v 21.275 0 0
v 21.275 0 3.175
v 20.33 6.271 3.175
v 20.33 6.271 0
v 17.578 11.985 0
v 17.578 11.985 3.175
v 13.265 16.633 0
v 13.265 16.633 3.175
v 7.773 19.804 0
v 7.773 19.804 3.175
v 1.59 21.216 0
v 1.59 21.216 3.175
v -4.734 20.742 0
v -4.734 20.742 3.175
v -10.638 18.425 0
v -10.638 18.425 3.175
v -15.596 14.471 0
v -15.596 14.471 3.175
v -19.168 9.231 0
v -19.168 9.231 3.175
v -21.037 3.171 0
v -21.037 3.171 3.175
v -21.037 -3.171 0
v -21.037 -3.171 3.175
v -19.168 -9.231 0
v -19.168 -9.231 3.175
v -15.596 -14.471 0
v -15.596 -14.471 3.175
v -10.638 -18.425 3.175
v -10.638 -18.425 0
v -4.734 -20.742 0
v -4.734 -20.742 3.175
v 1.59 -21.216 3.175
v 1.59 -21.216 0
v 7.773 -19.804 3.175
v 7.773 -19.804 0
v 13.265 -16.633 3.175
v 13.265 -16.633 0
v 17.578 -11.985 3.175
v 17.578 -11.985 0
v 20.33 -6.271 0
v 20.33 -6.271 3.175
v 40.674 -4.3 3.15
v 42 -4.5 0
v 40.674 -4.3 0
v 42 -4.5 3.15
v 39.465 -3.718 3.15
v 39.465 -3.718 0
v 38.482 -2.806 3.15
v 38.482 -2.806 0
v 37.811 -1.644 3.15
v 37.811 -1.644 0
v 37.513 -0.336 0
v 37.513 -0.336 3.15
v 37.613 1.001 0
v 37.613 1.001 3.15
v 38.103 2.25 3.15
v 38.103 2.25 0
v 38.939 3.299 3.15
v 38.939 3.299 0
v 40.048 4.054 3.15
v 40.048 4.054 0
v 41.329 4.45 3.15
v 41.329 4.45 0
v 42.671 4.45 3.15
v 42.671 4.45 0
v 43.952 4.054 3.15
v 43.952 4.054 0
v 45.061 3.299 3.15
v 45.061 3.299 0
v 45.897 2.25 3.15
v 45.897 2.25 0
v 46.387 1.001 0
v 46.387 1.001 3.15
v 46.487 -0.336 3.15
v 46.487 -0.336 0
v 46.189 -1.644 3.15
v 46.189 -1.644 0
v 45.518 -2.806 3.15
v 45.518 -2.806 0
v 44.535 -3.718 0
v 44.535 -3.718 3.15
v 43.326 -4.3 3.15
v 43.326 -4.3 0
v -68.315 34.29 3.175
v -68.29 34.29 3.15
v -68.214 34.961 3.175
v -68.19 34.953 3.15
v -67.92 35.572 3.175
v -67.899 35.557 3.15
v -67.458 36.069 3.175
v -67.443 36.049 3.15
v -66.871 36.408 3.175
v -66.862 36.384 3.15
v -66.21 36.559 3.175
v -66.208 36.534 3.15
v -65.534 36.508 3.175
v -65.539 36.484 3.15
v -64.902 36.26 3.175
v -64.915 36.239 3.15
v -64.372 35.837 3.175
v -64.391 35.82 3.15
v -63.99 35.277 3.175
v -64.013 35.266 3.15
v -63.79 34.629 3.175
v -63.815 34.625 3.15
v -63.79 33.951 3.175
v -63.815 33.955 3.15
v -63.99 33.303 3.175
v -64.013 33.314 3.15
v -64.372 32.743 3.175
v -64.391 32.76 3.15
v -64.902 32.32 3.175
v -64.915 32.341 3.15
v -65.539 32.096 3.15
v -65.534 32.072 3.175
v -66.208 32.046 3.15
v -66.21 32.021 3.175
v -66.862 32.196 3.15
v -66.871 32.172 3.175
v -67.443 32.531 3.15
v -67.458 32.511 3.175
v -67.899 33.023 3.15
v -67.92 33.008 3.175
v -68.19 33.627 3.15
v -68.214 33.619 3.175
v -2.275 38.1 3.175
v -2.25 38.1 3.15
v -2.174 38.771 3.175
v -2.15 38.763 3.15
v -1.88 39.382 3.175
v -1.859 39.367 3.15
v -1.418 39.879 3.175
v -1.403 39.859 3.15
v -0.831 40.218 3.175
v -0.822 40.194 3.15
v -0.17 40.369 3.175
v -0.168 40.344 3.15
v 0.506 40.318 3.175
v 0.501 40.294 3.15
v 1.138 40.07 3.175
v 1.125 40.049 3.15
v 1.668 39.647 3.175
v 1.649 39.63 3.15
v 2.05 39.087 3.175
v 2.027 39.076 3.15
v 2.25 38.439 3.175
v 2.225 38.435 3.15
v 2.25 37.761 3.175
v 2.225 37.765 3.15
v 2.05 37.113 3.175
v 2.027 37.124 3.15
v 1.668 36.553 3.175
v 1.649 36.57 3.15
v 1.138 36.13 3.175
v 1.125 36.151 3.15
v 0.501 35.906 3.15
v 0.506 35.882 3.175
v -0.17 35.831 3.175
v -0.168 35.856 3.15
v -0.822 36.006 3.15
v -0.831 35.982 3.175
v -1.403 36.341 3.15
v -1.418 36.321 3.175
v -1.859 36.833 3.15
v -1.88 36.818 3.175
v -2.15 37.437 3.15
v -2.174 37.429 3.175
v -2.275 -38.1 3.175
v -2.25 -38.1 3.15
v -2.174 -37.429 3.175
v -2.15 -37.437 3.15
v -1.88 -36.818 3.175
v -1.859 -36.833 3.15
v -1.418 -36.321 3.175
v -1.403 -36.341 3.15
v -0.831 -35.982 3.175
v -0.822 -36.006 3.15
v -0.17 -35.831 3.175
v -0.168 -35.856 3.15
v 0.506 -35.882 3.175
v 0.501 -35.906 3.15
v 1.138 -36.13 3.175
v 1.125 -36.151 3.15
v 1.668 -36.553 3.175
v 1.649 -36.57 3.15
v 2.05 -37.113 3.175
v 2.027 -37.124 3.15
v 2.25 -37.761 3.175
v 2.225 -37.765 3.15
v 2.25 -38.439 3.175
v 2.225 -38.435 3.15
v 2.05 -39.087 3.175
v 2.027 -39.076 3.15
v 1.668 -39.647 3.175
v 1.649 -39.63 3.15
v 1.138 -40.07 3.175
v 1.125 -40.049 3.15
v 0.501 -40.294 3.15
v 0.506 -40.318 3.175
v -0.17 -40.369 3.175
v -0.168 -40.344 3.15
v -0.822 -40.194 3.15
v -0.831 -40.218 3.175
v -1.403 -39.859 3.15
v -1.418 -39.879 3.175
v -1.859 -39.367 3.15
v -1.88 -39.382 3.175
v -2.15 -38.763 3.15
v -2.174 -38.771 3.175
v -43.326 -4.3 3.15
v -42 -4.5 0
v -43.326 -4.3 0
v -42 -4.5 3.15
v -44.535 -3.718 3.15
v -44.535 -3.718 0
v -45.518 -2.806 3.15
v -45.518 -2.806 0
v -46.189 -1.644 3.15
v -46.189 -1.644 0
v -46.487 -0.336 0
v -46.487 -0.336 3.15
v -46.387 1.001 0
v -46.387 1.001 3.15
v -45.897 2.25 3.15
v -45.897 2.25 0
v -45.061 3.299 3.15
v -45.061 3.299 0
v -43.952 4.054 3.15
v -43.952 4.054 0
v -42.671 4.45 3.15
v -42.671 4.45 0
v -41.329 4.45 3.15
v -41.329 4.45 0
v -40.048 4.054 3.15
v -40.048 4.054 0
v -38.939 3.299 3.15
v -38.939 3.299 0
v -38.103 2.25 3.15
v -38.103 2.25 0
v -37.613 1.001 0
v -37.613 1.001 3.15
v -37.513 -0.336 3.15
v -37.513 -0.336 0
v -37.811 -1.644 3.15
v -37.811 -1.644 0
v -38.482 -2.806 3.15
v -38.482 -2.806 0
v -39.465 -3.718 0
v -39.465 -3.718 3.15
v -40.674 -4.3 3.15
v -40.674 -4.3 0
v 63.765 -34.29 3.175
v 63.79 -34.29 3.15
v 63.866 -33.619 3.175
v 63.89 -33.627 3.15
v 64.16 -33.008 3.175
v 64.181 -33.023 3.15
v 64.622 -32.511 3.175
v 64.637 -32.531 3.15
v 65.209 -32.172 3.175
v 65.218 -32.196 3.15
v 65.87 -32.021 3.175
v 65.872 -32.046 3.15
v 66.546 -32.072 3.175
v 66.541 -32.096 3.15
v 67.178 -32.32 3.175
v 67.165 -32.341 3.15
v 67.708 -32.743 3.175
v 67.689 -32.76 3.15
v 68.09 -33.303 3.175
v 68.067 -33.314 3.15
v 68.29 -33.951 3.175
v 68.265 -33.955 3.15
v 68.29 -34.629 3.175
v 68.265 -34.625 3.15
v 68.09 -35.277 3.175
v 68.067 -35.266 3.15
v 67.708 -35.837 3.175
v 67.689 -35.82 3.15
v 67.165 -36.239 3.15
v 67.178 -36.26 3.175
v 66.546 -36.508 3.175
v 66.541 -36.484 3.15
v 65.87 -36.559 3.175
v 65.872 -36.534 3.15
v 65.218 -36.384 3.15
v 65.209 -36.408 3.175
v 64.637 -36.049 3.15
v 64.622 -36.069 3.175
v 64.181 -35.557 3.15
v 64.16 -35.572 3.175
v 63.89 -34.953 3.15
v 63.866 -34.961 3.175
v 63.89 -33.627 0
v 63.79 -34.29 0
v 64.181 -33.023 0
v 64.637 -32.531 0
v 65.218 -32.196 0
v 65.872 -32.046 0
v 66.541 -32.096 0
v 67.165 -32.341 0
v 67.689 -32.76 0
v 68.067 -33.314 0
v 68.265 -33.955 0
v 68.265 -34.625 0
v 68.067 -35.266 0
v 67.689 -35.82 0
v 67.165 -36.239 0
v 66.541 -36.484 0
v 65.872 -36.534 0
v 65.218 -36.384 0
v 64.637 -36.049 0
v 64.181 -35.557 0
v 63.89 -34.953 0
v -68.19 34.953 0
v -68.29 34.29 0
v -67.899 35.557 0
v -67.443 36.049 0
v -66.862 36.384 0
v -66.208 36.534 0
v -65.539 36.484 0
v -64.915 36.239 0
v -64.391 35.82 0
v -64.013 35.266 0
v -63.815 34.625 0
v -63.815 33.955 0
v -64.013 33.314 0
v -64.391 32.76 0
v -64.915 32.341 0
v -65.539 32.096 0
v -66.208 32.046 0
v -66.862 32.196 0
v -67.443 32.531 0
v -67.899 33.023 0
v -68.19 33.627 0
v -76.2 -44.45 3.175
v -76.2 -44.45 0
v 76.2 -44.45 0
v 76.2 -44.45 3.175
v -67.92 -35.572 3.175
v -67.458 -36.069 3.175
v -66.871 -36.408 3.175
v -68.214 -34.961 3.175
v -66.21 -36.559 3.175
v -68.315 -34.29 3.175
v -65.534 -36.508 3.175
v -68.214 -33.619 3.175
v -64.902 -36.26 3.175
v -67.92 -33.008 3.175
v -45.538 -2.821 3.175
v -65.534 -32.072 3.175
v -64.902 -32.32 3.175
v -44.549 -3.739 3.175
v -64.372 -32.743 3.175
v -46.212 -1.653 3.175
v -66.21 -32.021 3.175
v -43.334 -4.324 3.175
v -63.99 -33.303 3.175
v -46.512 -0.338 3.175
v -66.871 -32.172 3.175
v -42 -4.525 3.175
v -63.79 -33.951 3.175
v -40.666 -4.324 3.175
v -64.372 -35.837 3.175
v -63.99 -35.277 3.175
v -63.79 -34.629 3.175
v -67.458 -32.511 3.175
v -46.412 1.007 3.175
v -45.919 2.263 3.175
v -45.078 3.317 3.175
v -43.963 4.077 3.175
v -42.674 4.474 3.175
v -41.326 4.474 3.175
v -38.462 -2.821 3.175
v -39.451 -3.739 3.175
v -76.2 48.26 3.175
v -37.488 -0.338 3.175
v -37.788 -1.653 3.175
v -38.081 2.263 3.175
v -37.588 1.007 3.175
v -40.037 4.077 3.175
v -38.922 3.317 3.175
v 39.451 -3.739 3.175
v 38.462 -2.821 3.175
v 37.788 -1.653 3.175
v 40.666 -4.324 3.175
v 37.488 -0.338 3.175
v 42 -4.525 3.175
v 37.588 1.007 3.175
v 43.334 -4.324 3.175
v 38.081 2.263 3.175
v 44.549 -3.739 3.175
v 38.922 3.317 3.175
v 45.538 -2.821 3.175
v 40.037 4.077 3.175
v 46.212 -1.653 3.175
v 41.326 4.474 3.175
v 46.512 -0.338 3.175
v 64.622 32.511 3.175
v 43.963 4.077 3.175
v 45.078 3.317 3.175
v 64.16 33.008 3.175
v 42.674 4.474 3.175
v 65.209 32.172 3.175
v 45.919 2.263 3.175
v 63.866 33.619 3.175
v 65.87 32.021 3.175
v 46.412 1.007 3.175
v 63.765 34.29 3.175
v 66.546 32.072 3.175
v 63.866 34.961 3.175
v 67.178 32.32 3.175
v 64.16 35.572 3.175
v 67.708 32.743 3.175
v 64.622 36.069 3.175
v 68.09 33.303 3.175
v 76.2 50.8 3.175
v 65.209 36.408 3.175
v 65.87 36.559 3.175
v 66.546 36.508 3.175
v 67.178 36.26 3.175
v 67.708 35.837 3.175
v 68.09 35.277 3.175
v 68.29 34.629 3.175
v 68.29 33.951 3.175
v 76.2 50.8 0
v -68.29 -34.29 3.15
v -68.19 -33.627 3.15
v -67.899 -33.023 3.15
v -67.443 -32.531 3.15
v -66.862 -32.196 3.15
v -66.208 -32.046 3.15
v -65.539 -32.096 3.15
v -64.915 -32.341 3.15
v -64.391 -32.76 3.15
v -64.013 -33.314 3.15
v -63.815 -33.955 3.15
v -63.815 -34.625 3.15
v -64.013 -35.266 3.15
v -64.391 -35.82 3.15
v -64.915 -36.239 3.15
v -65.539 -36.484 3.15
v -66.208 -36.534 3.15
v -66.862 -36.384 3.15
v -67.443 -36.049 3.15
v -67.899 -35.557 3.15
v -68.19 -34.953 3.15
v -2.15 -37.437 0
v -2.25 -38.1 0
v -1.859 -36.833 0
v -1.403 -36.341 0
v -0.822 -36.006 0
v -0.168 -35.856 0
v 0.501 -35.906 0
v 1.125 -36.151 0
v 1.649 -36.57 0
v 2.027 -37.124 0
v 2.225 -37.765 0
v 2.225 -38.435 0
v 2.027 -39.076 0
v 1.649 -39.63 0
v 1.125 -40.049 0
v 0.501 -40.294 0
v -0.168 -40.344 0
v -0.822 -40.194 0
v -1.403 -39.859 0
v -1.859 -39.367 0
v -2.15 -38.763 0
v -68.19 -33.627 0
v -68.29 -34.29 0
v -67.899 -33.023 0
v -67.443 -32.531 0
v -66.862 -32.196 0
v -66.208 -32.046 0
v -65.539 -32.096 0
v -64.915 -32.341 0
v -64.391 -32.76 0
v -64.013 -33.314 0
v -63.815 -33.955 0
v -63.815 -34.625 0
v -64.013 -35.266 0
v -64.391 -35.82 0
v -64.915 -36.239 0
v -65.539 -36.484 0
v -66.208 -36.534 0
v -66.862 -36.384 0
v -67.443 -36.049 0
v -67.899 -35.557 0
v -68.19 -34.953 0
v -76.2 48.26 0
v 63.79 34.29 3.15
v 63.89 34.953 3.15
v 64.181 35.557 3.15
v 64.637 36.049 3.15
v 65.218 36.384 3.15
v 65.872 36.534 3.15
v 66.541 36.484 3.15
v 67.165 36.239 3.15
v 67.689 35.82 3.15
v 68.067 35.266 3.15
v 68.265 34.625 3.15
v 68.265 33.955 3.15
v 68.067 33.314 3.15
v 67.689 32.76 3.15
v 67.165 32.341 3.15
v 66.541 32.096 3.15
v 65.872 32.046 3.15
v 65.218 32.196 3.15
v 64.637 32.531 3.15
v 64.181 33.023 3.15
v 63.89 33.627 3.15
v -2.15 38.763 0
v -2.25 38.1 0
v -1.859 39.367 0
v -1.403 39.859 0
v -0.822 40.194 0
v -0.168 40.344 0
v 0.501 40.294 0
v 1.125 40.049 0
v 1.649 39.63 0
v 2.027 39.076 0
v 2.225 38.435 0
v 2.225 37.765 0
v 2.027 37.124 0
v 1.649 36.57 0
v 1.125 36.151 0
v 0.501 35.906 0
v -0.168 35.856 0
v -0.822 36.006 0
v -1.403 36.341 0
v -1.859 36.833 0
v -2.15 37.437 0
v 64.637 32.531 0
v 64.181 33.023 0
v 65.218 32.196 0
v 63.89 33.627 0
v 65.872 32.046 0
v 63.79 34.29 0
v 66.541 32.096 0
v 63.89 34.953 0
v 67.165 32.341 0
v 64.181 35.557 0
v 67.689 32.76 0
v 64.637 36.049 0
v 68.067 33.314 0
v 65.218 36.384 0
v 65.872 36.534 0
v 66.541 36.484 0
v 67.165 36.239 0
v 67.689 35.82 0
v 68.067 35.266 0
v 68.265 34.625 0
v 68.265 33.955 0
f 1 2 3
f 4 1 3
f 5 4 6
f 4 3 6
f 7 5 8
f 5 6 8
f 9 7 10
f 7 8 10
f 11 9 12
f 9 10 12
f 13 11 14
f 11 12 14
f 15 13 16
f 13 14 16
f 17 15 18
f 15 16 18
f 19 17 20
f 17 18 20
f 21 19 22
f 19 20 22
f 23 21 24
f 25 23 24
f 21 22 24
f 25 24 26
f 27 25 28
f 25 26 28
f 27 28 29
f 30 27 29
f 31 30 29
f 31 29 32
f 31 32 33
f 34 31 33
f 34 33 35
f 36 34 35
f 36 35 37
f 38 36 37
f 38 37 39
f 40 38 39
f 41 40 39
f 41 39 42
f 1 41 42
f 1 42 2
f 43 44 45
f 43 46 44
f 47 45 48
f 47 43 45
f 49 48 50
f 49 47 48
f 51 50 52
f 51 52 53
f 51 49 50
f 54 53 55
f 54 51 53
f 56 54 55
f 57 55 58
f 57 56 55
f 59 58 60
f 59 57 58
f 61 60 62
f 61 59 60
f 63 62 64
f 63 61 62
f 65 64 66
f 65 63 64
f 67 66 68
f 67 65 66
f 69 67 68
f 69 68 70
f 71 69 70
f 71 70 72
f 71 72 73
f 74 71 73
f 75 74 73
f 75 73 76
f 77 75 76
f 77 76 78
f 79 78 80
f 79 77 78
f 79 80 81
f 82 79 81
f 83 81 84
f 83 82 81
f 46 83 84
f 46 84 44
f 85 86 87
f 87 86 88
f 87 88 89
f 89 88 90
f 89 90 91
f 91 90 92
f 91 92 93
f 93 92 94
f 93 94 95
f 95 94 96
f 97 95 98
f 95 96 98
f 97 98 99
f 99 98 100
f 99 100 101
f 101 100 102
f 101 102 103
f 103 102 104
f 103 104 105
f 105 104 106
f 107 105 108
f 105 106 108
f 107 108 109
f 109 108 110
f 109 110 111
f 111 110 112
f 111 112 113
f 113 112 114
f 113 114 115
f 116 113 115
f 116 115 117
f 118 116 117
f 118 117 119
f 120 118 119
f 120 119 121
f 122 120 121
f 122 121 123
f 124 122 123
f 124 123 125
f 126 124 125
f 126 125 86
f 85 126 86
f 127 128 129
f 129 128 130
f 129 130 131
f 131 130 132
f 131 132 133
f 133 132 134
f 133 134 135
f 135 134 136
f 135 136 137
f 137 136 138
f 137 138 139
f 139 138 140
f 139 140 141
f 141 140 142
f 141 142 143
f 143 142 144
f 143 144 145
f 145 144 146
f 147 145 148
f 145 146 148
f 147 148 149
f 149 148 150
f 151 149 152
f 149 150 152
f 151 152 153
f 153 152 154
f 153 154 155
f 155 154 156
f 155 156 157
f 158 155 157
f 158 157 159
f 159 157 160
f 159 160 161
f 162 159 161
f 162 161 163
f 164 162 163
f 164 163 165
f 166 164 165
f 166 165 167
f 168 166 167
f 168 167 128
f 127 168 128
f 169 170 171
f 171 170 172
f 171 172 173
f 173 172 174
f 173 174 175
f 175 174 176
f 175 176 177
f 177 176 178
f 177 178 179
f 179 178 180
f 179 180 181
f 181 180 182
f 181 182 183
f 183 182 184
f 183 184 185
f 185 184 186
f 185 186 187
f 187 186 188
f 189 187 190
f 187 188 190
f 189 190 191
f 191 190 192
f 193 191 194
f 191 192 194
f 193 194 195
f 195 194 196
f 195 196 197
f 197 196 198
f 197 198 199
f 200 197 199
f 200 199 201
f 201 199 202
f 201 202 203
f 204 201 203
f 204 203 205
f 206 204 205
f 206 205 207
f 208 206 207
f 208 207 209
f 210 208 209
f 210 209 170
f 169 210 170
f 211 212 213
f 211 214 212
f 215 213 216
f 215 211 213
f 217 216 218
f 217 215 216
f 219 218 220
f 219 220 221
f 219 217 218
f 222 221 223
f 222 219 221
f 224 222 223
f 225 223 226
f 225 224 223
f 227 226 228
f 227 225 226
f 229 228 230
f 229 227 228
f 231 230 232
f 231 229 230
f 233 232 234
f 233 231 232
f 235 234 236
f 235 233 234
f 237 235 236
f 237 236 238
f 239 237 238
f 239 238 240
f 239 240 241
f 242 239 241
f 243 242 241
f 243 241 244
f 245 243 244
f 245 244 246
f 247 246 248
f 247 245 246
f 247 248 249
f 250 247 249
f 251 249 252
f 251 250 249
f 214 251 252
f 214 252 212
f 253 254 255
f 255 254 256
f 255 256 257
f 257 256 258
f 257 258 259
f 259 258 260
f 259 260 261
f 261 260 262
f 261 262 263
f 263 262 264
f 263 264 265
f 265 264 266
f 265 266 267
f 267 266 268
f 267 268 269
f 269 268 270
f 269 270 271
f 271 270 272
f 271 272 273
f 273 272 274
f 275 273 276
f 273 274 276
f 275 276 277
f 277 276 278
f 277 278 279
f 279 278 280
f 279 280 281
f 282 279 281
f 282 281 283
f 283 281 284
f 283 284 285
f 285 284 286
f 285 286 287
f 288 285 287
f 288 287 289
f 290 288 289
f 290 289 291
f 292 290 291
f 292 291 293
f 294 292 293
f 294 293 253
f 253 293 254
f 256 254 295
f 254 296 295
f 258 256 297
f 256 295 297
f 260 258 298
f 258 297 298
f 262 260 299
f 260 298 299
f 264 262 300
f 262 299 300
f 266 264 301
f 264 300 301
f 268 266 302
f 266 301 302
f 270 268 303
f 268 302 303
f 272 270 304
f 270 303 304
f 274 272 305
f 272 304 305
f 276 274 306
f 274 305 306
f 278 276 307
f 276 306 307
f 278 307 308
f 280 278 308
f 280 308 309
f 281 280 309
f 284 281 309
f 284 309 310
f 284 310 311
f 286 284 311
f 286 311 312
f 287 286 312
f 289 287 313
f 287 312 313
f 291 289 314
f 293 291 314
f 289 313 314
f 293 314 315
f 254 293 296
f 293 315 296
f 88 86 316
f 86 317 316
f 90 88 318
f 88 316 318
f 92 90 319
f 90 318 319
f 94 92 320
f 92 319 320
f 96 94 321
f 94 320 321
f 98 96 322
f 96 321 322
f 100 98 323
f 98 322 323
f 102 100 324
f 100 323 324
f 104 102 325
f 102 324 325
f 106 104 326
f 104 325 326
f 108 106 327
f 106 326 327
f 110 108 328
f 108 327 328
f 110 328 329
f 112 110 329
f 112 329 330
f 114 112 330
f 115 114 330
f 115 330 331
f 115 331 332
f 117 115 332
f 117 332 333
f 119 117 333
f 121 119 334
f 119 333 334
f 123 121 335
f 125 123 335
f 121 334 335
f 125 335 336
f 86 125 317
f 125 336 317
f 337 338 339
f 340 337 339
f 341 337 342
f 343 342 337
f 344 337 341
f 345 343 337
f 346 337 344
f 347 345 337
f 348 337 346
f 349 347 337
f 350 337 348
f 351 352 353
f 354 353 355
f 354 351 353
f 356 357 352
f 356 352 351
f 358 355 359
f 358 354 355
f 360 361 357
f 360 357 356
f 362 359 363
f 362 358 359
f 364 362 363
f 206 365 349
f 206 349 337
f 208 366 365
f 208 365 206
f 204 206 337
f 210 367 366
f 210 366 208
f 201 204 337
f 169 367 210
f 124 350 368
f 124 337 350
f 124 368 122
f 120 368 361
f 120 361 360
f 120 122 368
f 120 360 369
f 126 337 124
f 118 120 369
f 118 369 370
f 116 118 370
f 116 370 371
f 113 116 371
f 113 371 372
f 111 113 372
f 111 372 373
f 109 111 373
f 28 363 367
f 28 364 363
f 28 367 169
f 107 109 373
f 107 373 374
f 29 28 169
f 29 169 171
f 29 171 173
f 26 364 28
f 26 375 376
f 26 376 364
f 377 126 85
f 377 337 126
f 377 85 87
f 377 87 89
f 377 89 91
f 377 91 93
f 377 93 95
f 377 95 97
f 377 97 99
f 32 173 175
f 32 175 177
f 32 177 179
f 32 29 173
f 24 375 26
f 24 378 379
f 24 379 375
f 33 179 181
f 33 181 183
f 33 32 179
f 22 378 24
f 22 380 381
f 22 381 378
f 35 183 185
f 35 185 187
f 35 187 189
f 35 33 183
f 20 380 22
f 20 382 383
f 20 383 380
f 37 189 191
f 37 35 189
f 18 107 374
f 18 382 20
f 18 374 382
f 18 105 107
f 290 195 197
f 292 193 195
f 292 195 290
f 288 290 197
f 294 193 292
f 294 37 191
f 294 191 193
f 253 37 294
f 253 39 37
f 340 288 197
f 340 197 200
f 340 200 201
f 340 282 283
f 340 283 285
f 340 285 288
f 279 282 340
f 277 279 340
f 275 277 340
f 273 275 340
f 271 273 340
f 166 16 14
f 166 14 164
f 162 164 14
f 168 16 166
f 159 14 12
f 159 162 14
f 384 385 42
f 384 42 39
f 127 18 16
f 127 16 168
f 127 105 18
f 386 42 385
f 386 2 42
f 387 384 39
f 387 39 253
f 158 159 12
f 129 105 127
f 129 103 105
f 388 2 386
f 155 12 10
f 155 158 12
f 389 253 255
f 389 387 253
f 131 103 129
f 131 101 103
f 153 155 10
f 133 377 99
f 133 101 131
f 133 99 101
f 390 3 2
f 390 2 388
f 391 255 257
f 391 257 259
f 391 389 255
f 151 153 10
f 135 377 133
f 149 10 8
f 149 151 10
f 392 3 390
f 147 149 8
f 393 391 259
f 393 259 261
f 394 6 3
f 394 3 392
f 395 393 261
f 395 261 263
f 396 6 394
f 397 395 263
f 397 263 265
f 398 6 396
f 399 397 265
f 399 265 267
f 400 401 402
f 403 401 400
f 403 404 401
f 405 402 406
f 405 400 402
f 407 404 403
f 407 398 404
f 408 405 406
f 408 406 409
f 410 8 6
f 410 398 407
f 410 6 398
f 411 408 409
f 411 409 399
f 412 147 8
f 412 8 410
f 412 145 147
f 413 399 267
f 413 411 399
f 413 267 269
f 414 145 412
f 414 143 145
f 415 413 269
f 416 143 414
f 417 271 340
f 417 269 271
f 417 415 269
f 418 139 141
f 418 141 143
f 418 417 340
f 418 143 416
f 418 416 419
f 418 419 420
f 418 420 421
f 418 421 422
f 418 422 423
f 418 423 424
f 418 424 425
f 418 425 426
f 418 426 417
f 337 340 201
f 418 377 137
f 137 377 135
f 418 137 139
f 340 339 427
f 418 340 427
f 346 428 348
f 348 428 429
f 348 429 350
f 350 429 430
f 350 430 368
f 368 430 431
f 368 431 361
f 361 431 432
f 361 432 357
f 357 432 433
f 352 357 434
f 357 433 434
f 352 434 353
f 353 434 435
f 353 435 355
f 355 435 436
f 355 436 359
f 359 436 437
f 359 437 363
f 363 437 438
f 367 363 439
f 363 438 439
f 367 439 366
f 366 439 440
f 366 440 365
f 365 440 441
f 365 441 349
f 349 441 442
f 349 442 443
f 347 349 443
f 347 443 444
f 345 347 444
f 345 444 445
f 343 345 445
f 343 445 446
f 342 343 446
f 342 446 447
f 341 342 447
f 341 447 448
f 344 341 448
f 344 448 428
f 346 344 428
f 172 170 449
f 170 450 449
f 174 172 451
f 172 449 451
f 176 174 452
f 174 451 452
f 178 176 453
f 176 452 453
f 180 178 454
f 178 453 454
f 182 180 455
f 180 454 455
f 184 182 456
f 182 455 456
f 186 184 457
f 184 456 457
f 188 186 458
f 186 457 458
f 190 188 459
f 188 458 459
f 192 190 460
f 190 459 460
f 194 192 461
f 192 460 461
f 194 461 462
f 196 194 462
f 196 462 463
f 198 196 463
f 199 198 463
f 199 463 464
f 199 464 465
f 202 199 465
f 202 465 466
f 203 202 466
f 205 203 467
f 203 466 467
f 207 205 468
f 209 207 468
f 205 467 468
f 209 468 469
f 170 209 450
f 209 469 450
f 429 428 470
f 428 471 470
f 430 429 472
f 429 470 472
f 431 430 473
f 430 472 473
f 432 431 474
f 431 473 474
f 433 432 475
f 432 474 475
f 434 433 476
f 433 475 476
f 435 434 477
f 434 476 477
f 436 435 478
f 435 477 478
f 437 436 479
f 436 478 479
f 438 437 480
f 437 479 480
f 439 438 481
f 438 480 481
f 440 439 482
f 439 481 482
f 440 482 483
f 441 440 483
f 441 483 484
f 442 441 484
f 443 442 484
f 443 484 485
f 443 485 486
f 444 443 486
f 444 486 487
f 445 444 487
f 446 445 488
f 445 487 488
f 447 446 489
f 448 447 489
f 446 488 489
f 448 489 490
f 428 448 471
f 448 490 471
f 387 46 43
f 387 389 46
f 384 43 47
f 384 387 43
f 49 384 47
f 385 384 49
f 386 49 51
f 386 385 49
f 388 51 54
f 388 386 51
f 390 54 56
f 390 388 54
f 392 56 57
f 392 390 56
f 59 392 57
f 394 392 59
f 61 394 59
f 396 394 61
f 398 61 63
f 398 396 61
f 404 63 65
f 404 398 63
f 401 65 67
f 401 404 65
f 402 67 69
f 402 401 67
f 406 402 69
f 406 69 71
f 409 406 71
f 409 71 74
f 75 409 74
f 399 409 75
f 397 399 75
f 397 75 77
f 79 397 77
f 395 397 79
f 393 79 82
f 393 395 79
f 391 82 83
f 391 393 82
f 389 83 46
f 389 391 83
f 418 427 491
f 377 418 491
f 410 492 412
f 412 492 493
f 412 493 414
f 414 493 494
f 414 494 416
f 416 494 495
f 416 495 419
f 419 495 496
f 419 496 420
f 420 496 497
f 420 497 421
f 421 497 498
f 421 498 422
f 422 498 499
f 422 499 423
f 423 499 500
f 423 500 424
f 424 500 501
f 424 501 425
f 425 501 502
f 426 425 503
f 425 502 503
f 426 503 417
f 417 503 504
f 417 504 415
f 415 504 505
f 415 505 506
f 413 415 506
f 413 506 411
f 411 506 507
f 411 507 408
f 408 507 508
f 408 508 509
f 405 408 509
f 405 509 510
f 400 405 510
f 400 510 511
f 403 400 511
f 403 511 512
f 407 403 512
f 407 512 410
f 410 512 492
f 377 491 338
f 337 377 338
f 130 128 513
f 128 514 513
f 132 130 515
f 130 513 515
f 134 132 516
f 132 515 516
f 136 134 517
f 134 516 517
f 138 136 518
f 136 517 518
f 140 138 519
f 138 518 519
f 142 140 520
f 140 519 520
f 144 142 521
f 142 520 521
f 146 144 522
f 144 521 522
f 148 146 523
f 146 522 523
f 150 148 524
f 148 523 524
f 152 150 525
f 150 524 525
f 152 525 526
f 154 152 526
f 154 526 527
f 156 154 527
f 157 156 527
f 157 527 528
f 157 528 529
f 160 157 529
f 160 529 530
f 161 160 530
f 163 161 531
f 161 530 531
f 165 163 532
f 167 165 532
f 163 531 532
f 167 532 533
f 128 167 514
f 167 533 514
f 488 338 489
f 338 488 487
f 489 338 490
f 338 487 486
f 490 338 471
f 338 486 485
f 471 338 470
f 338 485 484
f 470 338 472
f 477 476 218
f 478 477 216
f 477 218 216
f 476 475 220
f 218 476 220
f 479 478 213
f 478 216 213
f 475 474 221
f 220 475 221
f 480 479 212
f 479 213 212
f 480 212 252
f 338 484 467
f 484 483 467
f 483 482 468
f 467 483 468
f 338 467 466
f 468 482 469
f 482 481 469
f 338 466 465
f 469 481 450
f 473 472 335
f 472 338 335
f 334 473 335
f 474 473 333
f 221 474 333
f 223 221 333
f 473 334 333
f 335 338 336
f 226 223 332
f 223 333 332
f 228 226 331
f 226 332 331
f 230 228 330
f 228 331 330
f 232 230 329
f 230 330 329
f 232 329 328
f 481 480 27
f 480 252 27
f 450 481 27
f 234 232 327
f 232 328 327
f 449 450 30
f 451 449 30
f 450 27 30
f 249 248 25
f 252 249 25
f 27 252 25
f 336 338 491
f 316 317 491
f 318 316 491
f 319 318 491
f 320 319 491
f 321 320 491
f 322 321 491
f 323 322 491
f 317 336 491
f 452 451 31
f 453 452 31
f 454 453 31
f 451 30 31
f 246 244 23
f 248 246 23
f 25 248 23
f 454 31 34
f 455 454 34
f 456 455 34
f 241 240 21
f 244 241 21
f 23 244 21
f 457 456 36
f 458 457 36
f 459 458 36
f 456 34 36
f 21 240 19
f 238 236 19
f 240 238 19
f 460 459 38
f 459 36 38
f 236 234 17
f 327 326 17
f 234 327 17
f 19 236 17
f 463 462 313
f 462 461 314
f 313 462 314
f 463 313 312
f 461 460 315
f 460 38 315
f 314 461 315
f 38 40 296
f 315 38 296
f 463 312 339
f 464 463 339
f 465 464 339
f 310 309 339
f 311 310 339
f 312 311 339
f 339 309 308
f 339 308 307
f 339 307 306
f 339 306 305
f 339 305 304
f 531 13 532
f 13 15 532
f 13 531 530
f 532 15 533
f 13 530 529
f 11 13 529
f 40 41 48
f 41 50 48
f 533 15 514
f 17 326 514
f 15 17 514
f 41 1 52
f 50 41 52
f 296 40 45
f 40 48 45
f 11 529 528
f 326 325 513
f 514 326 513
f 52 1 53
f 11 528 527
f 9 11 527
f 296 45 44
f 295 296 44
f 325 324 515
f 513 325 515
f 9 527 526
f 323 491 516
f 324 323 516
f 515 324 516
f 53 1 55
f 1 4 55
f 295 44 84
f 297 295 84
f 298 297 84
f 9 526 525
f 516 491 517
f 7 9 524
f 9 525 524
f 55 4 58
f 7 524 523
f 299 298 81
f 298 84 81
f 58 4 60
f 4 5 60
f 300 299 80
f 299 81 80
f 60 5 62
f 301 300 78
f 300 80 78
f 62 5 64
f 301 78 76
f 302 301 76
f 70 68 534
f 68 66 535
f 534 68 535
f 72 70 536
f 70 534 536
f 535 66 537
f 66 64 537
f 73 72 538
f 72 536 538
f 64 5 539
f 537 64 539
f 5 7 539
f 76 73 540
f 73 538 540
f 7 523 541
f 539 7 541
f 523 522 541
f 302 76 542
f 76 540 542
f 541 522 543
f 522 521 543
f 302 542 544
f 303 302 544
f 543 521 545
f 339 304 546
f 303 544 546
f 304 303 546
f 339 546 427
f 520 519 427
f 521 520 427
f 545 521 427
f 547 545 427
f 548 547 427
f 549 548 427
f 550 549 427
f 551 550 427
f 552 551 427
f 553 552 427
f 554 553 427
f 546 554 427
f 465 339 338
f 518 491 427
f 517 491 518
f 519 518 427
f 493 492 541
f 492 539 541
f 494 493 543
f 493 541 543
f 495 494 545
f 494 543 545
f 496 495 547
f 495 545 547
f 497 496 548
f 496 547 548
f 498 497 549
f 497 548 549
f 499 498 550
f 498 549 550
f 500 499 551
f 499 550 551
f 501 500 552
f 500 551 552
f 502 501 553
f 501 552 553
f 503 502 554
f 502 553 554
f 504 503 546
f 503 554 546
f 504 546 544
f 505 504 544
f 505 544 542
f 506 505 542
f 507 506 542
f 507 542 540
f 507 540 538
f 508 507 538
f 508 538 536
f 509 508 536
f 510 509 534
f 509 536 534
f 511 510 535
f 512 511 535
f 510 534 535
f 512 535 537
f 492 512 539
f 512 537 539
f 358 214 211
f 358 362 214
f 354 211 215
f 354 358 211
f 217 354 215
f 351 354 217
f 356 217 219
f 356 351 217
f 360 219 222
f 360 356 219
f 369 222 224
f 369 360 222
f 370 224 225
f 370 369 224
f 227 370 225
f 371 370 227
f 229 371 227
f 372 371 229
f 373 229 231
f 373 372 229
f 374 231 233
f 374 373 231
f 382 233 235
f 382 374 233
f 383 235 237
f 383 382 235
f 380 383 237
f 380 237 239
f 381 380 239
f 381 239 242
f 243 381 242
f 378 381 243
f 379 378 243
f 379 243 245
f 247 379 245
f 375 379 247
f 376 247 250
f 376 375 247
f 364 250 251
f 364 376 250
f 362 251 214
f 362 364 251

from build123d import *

# Parameters (mm, degrees)
BOSS_EXTRUDE1_DEPTH            = 3.175
M4_CLEARANCE_HOLE1_D           = 4.5
M4_CLEARANCE_HOLE1_CSINK_D     = 4.55
M4_CLEARANCE_HOLE1_CSINK_ANGLE = 90
M8_CLEARANCE_HOLE1_AT_2_COUNT  = 2
M8_CLEARANCE_HOLE1_AT_2_PITCH  = 84
SKETCH9_R                      = 21.275
CENTER_HOLE_DEPTH              = 4.175


with BuildPart() as part:
    # Sketch1 → Boss-Extrude1 (new body)
    with BuildSketch(Plane.XY):
        Polygon((-76.2, 48.26), (-76.2, 44.45), (-76.2, -44.45), (76.2, -44.45), (76.2, 44.45), (76.2, 50.8), align=None)
    extrude(amount=BOSS_EXTRUDE1_DEPTH)

    # M4 Clearance Hole1 (through all)
    with Locations(Plane.XY.offset(3.175)):
        with Locations((0, 38.1), (-66.04, 34.29), (-66.04, -34.29), (0, -38.1), (66.04, -34.29), (66.04, 34.29)):
            CounterSinkHole(M4_CLEARANCE_HOLE1_D / 2, M4_CLEARANCE_HOLE1_CSINK_D / 2, counter_sink_angle=M4_CLEARANCE_HOLE1_CSINK_ANGLE)

    # Sketch11 → M8 Clearance Hole1 (revolve, cut)
    with BuildSketch(Plane(origin=(-42, 0, 3.175), x_dir=(0, -1, 0), z_dir=(1, 0, 0))):
        Polygon((0, 0), (0, 3.175), (4.5, 3.175), (4.5, 0.025), (4.525, 0), align=None)
    m8_clearance_hole1 = revolve(axis=Axis((-42, 0, 9.525), (0, 0, -1)), mode=Mode.SUBTRACT)

    # M8 Clearance Hole1 at 2: M8 Clearance Hole1 ×2
    with Locations(*[(i * M8_CLEARANCE_HOLE1_AT_2_PITCH, 0, 0) for i in range(1, M8_CLEARANCE_HOLE1_AT_2_COUNT)]):
        add(m8_clearance_hole1, mode=Mode.SUBTRACT)

    # Sketch9 → Center Hole (cut, through all)
    with BuildSketch(Plane.XY.offset(3.175)):
        Circle(SKETCH9_R)
    extrude(amount=-CENTER_HOLE_DEPTH, mode=Mode.SUBTRACT)


solid = part.part
